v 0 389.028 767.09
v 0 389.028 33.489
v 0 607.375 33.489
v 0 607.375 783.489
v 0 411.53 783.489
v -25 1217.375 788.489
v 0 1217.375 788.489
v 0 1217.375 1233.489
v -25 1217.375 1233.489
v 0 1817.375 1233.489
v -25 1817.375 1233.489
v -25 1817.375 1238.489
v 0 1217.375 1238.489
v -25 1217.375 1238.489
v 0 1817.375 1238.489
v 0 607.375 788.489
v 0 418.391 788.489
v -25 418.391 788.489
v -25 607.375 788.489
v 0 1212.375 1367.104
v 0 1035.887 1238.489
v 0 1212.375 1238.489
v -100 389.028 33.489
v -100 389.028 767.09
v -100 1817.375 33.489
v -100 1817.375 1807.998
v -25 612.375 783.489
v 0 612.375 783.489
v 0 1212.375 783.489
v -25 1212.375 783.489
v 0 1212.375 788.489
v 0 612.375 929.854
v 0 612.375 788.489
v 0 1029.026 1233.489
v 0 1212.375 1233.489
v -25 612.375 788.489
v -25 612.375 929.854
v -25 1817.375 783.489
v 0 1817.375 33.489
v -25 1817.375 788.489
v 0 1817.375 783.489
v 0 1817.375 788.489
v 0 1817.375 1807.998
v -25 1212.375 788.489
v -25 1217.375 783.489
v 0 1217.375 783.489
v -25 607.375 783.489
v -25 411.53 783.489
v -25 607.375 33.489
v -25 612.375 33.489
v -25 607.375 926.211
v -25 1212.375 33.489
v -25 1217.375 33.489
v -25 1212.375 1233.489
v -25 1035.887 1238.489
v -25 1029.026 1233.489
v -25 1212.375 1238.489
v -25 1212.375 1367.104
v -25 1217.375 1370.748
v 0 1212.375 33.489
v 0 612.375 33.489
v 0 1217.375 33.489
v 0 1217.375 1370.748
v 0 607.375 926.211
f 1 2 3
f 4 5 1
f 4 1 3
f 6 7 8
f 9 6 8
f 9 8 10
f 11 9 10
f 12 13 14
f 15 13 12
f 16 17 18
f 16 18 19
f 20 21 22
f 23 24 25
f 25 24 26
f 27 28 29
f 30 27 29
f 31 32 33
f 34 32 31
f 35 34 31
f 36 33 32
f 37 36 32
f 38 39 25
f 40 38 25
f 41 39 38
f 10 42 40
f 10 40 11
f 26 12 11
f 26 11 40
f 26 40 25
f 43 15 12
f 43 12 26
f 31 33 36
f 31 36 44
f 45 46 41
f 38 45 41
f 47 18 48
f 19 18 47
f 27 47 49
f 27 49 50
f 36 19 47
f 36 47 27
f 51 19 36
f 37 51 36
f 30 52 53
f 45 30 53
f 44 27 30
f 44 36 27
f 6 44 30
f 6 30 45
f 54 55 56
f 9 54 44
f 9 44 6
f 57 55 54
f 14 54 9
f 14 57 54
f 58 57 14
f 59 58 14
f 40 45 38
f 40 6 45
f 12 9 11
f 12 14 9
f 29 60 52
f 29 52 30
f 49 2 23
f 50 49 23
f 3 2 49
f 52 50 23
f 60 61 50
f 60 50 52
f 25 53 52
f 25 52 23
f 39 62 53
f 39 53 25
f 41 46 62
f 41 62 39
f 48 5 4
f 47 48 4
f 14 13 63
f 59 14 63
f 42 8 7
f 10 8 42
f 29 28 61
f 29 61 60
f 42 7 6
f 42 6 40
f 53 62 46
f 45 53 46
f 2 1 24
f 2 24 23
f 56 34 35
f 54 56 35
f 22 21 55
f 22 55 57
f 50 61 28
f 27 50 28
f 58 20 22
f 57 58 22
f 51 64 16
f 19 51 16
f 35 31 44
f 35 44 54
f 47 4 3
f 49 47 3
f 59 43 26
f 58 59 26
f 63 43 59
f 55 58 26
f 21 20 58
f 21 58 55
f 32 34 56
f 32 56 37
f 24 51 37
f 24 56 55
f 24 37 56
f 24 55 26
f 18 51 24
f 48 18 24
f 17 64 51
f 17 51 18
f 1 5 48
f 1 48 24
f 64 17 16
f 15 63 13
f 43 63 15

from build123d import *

# Parameters (mm, degrees)
F1_DEPTH = 100
F2_W     = 5
F2_H     = 581
F2_W_2   = 1636.7888212204
F2_H_2   = 5
F2_W_3   = 600
F2_H_3   = 1200
F2_W_4   = 607.3750638962
F3_DEPTH = 25
F4_W     = 2650
F4_H     = 5
F5_DEPTH = 25


with BuildPart() as f1:
    # F0 (on Right) → F1 (new body)
    with BuildSketch(Plane.YZ):
        Polygon((389.0280389786, 767.0902125925), (389.0280389786, 33.4885828197), (1817.3750638962, 33.4885828197), (1817.3750638962, 1807.9981070012), align=None)
    extrude(amount=-F1_DEPTH)

    # F2 (on Right) → F3 (cut)
    with BuildSketch(Plane.YZ):
        with Locations((1214.8750638962, 1528.9885828197)):
            Rectangle(F2_W, F2_H)
        with Locations((2035.7694745064, 1235.9885828197)):
            Rectangle(F2_W_2, F2_H_2)
        with Locations((1214.8750638962, 1235.9885828197)):
            Rectangle(F2_W, F2_H_2)
        with Locations((912.3750638962, 1235.9885828197)):
            Rectangle(F2_W_3, F2_H_2)
        with Locations((1214.8750638962, 633.4885828197)):
            Rectangle(F2_W, F2_H_3)
        with Locations((609.8750638962, 1528.9885828197)):
            Rectangle(F2_W, F2_H)
        with Locations((609.8750638962, 1235.9885828197)):
            Rectangle(F2_W, F2_H_2)
        with Locations((609.8750638962, 633.4885828197)):
            Rectangle(F2_W, F2_H_3)
        with Locations((303.6875319481, 1235.9885828197)):
            Rectangle(F2_W_4, F2_H_2)
    extrude(amount=-F3_DEPTH, mode=Mode.SUBTRACT)

    # F4 (on face) → F5 (cut)
    with BuildSketch(Plane.YZ):
        with Locations((1624.0280389786, 785.9885828197)):
            Rectangle(F4_W, F4_H)
    extrude(amount=-F5_DEPTH, mode=Mode.SUBTRACT)


solid = f1.part
